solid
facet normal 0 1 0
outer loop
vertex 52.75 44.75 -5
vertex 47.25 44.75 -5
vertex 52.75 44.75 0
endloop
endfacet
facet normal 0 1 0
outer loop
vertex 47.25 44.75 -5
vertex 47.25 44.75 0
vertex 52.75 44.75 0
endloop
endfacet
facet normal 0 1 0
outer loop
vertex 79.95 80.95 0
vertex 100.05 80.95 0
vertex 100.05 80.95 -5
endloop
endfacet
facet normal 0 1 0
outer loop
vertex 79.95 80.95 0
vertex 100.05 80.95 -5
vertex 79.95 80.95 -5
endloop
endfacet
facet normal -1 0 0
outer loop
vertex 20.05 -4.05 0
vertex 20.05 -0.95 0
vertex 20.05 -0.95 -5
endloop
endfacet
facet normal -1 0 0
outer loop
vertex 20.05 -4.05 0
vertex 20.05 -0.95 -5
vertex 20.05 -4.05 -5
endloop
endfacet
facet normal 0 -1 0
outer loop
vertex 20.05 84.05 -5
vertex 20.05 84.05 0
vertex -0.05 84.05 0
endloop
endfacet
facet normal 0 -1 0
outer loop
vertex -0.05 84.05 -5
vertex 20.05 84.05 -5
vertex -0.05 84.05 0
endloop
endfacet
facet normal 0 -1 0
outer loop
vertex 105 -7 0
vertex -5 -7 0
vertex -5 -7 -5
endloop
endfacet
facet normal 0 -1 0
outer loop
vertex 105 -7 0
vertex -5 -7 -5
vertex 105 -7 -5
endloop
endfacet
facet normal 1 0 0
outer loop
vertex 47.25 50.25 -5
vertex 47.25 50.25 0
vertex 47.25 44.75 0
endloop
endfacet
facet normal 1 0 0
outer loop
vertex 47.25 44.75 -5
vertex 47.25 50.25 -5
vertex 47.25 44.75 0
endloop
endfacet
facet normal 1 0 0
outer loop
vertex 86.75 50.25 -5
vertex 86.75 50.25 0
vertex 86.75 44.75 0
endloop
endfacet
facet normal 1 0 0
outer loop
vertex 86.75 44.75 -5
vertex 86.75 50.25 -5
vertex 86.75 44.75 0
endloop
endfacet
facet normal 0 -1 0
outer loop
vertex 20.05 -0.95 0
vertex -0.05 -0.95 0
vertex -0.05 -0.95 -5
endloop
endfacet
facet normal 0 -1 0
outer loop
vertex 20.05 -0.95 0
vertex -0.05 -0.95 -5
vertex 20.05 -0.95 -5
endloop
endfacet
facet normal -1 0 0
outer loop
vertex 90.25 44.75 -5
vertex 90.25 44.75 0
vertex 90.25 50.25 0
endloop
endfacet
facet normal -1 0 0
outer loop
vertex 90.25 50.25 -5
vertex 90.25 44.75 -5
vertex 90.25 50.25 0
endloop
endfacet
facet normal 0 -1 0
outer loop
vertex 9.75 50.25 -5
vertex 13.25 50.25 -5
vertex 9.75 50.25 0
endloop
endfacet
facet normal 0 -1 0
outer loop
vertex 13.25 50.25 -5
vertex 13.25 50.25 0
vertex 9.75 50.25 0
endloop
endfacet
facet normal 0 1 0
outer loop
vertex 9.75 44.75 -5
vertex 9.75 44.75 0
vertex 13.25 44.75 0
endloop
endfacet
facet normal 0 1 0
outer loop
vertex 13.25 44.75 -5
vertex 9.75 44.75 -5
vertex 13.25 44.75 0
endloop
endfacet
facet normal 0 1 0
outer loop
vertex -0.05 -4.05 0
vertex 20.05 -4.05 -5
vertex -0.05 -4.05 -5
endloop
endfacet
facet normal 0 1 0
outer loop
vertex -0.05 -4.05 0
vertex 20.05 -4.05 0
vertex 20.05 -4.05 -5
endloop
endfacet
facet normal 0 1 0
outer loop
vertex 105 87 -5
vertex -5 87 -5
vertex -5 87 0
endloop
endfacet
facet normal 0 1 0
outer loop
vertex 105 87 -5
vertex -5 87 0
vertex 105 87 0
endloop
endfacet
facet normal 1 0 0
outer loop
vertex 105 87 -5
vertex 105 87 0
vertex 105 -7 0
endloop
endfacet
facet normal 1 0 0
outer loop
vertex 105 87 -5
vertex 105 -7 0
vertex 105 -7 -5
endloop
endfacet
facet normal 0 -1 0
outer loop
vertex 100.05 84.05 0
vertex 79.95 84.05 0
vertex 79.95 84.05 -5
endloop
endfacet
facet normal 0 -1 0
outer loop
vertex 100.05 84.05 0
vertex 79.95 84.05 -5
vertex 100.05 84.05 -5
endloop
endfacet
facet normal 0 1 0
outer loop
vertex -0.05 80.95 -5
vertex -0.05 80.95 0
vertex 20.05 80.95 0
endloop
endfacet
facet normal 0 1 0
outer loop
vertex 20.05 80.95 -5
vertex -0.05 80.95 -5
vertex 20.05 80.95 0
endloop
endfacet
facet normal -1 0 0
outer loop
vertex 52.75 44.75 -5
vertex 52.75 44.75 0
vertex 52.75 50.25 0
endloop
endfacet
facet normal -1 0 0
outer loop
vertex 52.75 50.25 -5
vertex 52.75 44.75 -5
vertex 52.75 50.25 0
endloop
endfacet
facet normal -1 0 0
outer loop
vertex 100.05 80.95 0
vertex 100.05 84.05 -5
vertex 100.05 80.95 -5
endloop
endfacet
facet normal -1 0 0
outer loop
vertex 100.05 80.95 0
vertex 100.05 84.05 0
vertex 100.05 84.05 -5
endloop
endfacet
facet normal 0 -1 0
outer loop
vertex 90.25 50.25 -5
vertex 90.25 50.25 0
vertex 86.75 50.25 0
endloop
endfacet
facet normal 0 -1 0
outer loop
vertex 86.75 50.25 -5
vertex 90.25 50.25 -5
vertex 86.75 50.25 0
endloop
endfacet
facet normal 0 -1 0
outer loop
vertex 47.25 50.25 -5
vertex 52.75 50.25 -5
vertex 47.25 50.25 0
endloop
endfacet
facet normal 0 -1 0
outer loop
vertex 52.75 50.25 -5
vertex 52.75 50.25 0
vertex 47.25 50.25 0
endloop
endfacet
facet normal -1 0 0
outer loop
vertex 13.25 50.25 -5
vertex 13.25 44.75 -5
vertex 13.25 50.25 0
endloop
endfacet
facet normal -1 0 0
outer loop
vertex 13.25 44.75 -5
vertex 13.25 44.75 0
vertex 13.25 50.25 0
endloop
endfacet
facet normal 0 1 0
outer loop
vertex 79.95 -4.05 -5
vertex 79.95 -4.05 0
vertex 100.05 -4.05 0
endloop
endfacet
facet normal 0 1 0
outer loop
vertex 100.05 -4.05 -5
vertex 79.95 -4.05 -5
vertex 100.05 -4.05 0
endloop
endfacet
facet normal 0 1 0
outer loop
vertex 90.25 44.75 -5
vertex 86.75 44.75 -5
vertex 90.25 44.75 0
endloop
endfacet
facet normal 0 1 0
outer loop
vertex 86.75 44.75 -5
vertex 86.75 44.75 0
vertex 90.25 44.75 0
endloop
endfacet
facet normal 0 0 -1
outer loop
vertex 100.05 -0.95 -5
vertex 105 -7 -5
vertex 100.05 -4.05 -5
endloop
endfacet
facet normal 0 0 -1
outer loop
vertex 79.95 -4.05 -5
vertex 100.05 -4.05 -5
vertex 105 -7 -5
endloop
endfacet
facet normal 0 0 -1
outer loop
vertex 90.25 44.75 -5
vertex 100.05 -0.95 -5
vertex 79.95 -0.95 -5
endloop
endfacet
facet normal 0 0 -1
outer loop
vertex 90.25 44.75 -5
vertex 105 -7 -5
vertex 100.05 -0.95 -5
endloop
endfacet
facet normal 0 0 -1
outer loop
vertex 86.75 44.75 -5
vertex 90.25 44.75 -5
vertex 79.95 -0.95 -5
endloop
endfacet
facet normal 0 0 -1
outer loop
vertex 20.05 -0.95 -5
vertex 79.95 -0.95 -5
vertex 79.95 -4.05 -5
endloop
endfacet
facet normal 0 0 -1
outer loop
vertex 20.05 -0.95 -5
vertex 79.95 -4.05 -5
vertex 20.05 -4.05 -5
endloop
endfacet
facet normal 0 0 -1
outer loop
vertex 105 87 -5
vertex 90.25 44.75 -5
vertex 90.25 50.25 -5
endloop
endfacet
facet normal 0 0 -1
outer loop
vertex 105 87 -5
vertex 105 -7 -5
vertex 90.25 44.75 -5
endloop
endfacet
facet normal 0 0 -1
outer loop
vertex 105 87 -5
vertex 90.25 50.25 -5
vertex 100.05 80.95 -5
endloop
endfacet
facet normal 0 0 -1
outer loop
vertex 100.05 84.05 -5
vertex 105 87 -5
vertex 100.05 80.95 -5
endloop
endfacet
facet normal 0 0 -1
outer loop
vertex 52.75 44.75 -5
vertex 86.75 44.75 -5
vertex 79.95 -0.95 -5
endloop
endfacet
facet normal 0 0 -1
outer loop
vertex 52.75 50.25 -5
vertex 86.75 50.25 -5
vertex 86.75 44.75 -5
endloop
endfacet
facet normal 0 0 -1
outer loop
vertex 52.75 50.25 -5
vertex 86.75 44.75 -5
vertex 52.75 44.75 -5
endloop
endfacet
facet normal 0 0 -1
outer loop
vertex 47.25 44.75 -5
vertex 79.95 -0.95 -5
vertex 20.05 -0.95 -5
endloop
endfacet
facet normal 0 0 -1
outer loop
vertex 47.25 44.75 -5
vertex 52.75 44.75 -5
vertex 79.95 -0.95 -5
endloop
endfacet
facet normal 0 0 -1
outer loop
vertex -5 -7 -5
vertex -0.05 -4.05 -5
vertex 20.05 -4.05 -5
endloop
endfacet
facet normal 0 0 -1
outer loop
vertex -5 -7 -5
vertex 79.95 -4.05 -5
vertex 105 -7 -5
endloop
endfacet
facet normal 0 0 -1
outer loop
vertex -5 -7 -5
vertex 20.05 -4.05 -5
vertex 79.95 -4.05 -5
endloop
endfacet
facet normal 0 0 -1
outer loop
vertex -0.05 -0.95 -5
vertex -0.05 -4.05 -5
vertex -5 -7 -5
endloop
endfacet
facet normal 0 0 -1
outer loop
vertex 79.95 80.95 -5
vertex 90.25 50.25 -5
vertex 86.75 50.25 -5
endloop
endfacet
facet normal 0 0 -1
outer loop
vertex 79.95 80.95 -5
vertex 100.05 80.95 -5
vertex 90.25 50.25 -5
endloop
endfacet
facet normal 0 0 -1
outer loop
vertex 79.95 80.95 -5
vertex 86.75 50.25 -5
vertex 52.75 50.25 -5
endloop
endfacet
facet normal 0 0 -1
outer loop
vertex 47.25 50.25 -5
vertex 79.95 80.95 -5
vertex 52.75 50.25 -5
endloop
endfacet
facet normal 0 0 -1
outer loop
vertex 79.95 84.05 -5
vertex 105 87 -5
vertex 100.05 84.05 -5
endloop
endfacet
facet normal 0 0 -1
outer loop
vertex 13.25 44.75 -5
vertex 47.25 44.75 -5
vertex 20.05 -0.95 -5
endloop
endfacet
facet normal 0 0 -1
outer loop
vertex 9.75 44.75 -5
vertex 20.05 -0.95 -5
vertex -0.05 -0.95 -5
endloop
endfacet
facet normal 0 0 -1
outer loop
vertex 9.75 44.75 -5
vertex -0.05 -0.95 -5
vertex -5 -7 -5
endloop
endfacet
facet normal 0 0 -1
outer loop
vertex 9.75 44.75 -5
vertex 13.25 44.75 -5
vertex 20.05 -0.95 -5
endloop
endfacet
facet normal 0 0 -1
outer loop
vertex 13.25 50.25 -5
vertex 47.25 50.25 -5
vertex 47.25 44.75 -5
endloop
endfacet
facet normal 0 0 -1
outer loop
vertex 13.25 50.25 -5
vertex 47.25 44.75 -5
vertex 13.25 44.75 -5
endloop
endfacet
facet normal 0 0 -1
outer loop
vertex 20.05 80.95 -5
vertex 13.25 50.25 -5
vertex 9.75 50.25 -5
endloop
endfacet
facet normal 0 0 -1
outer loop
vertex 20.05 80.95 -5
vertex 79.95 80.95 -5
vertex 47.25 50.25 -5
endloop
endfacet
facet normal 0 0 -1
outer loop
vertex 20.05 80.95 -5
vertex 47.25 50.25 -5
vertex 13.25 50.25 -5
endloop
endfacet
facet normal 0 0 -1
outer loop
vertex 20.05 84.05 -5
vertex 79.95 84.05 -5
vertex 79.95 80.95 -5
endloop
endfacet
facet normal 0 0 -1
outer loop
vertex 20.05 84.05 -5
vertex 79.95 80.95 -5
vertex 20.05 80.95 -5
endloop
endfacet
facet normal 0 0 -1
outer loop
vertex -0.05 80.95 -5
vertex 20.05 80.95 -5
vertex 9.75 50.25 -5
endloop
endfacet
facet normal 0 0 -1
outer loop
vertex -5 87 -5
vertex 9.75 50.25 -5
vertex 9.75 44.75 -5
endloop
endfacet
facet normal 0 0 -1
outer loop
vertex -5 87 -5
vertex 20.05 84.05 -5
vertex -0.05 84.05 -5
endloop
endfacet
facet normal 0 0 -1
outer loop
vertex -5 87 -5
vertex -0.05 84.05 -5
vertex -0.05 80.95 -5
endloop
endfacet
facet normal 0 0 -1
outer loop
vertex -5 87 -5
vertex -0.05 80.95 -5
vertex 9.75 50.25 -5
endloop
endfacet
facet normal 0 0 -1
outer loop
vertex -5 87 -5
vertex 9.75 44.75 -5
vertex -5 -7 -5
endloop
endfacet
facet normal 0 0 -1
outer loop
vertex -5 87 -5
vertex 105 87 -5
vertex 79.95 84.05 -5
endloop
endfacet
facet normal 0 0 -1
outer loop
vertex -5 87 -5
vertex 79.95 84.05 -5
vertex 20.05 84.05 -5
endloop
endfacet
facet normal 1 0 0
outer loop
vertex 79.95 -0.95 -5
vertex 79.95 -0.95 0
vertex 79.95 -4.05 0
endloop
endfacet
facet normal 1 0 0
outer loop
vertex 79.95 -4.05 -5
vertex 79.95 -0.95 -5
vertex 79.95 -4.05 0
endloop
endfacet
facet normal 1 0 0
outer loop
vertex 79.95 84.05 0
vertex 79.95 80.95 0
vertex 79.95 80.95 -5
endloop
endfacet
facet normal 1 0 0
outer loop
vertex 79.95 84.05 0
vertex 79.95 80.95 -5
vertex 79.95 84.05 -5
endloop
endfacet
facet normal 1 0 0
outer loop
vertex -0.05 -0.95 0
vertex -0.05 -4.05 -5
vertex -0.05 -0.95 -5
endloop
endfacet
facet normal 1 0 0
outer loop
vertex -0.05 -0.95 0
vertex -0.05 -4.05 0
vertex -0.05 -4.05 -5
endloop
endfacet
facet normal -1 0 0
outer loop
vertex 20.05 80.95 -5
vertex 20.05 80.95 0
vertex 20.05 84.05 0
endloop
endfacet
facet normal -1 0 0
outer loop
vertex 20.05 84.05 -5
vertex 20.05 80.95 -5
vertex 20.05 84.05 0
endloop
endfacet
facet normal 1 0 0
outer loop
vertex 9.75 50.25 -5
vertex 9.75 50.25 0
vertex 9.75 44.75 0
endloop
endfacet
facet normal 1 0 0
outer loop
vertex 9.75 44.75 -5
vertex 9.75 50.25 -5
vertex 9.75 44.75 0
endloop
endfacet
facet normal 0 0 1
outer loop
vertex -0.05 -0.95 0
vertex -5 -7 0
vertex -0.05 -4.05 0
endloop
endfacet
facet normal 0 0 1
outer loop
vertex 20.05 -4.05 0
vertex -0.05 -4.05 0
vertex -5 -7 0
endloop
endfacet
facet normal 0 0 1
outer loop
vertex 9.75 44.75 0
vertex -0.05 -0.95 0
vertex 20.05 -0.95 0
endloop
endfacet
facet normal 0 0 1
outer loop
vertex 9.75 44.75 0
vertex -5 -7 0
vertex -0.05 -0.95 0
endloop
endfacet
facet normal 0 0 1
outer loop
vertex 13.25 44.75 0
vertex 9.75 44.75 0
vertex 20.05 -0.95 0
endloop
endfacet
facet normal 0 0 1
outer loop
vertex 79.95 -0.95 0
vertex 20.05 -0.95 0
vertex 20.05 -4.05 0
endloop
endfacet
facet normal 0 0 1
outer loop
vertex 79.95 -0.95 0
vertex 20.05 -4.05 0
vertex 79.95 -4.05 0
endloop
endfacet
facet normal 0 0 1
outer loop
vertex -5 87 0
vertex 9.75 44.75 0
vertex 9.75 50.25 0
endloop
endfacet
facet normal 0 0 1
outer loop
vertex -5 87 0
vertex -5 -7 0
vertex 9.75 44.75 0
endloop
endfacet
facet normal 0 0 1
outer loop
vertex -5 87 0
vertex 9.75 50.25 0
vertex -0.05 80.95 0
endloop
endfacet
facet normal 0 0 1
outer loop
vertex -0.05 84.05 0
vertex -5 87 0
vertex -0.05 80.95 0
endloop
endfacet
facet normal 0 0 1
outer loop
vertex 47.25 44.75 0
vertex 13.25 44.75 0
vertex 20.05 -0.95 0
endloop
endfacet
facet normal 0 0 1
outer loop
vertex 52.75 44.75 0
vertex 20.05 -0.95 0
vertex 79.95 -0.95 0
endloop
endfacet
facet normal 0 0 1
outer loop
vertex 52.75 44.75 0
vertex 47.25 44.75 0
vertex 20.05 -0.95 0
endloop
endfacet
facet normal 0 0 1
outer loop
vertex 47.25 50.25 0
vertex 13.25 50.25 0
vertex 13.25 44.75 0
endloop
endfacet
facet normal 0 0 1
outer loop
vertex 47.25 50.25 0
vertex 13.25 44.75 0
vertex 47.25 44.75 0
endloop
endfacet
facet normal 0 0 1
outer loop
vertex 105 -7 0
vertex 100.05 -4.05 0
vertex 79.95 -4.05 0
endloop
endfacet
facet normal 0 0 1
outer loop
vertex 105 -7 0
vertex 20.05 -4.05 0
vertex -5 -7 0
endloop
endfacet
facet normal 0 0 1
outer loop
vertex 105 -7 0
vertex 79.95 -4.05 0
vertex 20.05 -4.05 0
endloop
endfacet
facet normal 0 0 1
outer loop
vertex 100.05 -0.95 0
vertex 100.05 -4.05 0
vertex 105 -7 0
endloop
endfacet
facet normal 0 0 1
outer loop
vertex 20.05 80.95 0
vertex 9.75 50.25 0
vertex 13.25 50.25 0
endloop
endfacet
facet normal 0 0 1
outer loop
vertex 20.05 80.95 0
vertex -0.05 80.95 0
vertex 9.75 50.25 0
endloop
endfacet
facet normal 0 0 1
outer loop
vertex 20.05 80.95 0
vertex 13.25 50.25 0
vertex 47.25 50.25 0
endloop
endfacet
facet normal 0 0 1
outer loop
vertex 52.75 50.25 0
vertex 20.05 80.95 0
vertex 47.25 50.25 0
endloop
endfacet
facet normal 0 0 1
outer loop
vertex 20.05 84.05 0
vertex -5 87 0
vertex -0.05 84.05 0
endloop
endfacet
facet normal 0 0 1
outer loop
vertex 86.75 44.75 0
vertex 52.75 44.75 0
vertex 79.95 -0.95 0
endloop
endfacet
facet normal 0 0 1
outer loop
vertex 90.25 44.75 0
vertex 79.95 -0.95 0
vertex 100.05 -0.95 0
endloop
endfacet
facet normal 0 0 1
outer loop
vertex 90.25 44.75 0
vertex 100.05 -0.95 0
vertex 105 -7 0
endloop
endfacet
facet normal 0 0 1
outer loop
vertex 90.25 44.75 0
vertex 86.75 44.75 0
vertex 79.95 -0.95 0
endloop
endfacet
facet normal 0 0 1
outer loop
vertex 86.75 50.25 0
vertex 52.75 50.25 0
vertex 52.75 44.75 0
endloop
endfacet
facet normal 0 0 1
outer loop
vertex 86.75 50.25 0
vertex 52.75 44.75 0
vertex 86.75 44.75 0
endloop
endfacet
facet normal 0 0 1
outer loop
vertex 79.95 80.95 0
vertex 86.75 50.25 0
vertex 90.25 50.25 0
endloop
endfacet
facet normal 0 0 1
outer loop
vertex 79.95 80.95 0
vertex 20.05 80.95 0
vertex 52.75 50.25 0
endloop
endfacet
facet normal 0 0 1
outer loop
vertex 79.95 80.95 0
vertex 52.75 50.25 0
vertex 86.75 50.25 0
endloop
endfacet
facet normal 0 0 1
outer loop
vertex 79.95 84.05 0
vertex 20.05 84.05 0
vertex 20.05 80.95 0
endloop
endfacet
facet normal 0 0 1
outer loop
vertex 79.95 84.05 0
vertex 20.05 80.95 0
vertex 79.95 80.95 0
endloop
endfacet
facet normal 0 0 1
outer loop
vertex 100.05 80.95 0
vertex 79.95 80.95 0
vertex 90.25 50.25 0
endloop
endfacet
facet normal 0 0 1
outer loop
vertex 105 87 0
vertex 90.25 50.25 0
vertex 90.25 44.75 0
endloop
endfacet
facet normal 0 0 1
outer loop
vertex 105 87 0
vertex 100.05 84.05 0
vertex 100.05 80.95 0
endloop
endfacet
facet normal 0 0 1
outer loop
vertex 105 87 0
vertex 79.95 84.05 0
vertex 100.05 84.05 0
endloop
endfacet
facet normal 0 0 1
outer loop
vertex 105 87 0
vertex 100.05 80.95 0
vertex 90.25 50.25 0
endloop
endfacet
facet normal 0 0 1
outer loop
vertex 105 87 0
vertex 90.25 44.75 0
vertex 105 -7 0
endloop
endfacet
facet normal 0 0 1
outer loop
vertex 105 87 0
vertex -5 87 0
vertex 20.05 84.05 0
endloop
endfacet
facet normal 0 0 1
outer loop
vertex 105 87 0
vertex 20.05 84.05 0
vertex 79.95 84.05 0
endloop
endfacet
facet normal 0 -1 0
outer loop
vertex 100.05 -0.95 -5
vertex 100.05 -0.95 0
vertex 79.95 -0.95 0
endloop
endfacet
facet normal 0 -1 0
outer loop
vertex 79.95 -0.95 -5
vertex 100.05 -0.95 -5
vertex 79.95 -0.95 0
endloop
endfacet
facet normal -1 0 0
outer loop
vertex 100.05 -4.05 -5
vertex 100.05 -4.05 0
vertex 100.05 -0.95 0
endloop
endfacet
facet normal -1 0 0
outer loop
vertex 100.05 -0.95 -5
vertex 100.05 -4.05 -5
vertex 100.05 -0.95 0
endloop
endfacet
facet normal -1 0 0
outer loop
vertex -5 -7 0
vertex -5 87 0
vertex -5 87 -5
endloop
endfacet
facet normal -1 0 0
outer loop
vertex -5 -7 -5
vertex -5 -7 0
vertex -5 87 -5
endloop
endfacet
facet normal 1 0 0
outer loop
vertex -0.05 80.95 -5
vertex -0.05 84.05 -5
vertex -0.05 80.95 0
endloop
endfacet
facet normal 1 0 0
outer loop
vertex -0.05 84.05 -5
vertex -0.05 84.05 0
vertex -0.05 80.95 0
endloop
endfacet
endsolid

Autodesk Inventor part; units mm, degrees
ref_plane "YZ Plane" through (0, 0, 0) normal (1, 0, 0) x (0, 1, 0)
ref_plane "XZ Plane" through (0, 0, 0) normal (0, 1, 0) x (-1, 0, 0)
ref_plane "XY Plane" through (0, 0, 0) normal (0, 0, 1) x (1, 0, 0)
sketch "Esquisse1" plane through (0, 0, 0) normal (0, 0, 1) x (1, 0, 0)
  line L0 (0, 0) -> (100, 0)
  line L1 (100, 0) -> (100, 80)
  line L2 (100, 80) -> (0, 80)
  line L3 (0, 80) -> (0, 0)
  dimension "d0" = 100
  dimension "d1" = 80
extrude "Extrusion1" add sketch "Esquisse1" against normal blind 5
sketch "Esquisse7" plane through (0, 0, 0) normal (0, 0, 1) x (1, 0, 0)
  line L0 (0, 0) -> (0, 45)
  line L1 (0, 0) -> (0, 80) projected
  line L2 (0, 45) -> (100, 45)
  line L3 (50, 45) -> (10, 45)
  line L4 (50, 45) -> (90, 45)
  line L5 (10, 45) -> (13, 45)
  line L6 (13, 45) -> (13, 50)
  line L7 (13, 50) -> (10, 50)
  line L8 (10, 50) -> (10, 45)
  line L9 (90, 45) -> (87, 45)
  line L10 (87, 45) -> (87, 50)
  line L11 (87, 50) -> (90, 50)
  line L12 (90, 50) -> (90, 45)
  line L13 (50, 45) -> (52.5, 45)
  line L14 (52.5, 45) -> (52.5, 50)
  line L15 (52.5, 50) -> (47.5, 50)
  line L16 (47.5, 50) -> (47.5, 45)
  line L17 (50, 45) -> (47.5, 45)
  line L18 (86.75, 44.75) -> (90.25, 44.75)
  line L19 (90.25, 44.75) -> (90.25, 50.25)
  line L20 (90.25, 50.25) -> (86.75, 50.25)
  line L21 (86.75, 50.25) -> (86.75, 44.75)
  line L22 (86.75, 44.75) -> (90.25, 50.25) construction
  line L23 (90.25, 44.75) -> (86.75, 50.25) construction
  line L24 (47.25, 44.75) -> (52.75, 44.75)
  line L25 (52.75, 44.75) -> (52.75, 50.25)
  line L26 (52.75, 50.25) -> (47.25, 50.25)
  line L27 (47.25, 50.25) -> (47.25, 44.75)
  line L28 (47.25, 44.75) -> (52.75, 50.25) construction
  line L29 (52.75, 44.75) -> (47.25, 50.25) construction
  line L30 (9.75, 44.75) -> (13.25, 44.75)
  line L31 (13.25, 44.75) -> (13.25, 50.25)
  line L32 (13.25, 50.25) -> (9.75, 50.25)
  line L33 (9.75, 50.25) -> (9.75, 44.75)
  line L34 (9.75, 44.75) -> (13.25, 50.25) construction
  line L35 (13.25, 44.75) -> (9.75, 50.25) construction
  point P0 (87, 45)
  point P1 (13, 45)
  point P2 (52.5, 45)
  point P3 (88.5, 47.5)
  point P4 (50, 47.5)
  point P5 (11.5, 47.5)
  point P6 (90.25, 45)
  point P7 (86.75, 45)
  point P8 (52.75, 45)
  point P9 (47.25, 45)
  point P10 (13.25, 45)
  point P11 (9.75, 45)
  point P12 (87, 45.05)
  point P13 (90, 45.05)
  dimension "d42" = 45
  dimension "d43" = 100
  dimension "d44" = 40
  dimension "d45" = 40
  dimension "d46" = 3
  dimension "d47" = 5
  dimension "d48" = 3
  dimension "d49" = 5
  dimension "d53" = 2.5
  dimension "d54" = 5
  dimension "d55" = 5
  dimension "d56" = 3.5
  dimension "d57" = 5.5
  dimension "d58" = 5.5
  dimension "d59" = 3.5
  dimension "d60" = 5.5
  dimension "d61" = 5.5
extrude "Extrusion2" cut sketch "Esquisse7" against normal through all
sketch "Esquisse8" plane through (0, 0, 0) normal (0, 0, 1) x (1, 0, 0)
  line L0 (0, 0) -> (0, 40)
  line L1 (0, 0) -> (0, 80) projected
  line L2 (0, 40) -> (50, 40)
  line L3 (100, 80) -> (100, 0) projected
  line L4 (-5, -5) -> (105, -5)
  line L5 (105, -5) -> (105, 85)
  line L6 (105, 85) -> (-5, 85)
  line L7 (-5, 85) -> (-5, -5)
  line L8 (-5, -5) -> (105, 85) construction
  line L9 (105, -5) -> (-5, 85) construction
  line L10 (100, 80) -> (0, 80) projected
  line L11 (0, 80) -> (0, 0) projected
  line L12 (0, 0) -> (100, 0) projected
  line L13 (100, 0) -> (100, 80) projected
  dimension "d62" = 40
  dimension "d63" = 50
  dimension "d64" = 110
  dimension "d65" = 90
extrude "Extrusion3" add sketch "Esquisse8" against normal blind 5
sketch "Esquisse9" plane through (0, 0, 0) normal (0, 0, 1) x (1, 0, 0)
  line L0 (0, 0) -> (-0.05, 0)
  line L1 (-0.05, 0) -> (-0.05, -0.95)
  line L2 (-0.05, -0.95) -> (20.05, -0.95)
  line L3 (20.05, -0.95) -> (20.05, -4.05)
  line L4 (20.05, -4.05) -> (-0.05, -4.05)
  line L5 (-0.05, -4.05) -> (-0.05, -0.95)
  line L6 (-5, -5) -> (105, -5) projected
  line L7 (105, -5) -> (50, -5)
  line L8 (50, -5) -> (50, 40.0521)
  line L9 (-5, -5) -> (-5, 85) projected
  line L10 (-5, 85) -> (-5, 40)
  line L11 (-5, 40) -> (20.05, 40)
  line L12 (100.05, -0.95) -> (79.95, -0.95)
  line L13 (79.95, -0.95) -> (79.95, -4.05)
  line L14 (79.95, -4.05) -> (100.05, -4.05)
  line L15 (100.05, -4.05) -> (100.05, -0.95)
  line L16 (-0.05, 80.95) -> (20.05, 80.95)
  line L17 (20.05, 80.95) -> (20.05, 84.05)
  line L18 (20.05, 84.05) -> (-0.05, 84.05)
  line L19 (-0.05, 84.05) -> (-0.05, 80.95)
  line L20 (100.05, 80.95) -> (79.95, 80.95)
  line L21 (79.95, 84.05) -> (100.05, 84.05)
  line L22 (79.95, 80.95) -> (79.95, 84.05)
  line L23 (100.05, 84.05) -> (100.05, 80.95)
  dimension "d68" = 0.05
  dimension "d69" = 0.95
  dimension "d70" = 20.1
  dimension "d71" = 3.1
  dimension "d72" = 55
  dimension "d73" = 45
extrude "Extrusion4" cut sketch "Esquisse9" against normal blind 5
sketch "Esquisse10" plane through (-5, 85, 0) normal (0, 1, 0) x (1, 0, 0)
  line L0 (110, 0) -> (0, 0) projected
  line L1 (110, 0) -> (110, 5) projected
  line L2 (0, 5) -> (110, 5) projected
  line L3 (0, 0) -> (0, 5) projected
  point P0 (5, 0)
extrude "Extrusion5" add sketch "Esquisse10" along normal blind 2
sketch "Esquisse11" plane through (-5, -5, 0) normal (0, -1, 0) x (1, 0, 0)
  line L0 (0, 0) -> (110, 0) projected
  line L1 (0, 0) -> (0, -5) projected
  line L2 (110, -5) -> (0, -5) projected
  line L3 (110, 0) -> (110, -5) projected
  point P0 (5, 0)
extrude "Extrusion6" add sketch "Esquisse11" along normal blind 2
properties part number "chassis arriere"
